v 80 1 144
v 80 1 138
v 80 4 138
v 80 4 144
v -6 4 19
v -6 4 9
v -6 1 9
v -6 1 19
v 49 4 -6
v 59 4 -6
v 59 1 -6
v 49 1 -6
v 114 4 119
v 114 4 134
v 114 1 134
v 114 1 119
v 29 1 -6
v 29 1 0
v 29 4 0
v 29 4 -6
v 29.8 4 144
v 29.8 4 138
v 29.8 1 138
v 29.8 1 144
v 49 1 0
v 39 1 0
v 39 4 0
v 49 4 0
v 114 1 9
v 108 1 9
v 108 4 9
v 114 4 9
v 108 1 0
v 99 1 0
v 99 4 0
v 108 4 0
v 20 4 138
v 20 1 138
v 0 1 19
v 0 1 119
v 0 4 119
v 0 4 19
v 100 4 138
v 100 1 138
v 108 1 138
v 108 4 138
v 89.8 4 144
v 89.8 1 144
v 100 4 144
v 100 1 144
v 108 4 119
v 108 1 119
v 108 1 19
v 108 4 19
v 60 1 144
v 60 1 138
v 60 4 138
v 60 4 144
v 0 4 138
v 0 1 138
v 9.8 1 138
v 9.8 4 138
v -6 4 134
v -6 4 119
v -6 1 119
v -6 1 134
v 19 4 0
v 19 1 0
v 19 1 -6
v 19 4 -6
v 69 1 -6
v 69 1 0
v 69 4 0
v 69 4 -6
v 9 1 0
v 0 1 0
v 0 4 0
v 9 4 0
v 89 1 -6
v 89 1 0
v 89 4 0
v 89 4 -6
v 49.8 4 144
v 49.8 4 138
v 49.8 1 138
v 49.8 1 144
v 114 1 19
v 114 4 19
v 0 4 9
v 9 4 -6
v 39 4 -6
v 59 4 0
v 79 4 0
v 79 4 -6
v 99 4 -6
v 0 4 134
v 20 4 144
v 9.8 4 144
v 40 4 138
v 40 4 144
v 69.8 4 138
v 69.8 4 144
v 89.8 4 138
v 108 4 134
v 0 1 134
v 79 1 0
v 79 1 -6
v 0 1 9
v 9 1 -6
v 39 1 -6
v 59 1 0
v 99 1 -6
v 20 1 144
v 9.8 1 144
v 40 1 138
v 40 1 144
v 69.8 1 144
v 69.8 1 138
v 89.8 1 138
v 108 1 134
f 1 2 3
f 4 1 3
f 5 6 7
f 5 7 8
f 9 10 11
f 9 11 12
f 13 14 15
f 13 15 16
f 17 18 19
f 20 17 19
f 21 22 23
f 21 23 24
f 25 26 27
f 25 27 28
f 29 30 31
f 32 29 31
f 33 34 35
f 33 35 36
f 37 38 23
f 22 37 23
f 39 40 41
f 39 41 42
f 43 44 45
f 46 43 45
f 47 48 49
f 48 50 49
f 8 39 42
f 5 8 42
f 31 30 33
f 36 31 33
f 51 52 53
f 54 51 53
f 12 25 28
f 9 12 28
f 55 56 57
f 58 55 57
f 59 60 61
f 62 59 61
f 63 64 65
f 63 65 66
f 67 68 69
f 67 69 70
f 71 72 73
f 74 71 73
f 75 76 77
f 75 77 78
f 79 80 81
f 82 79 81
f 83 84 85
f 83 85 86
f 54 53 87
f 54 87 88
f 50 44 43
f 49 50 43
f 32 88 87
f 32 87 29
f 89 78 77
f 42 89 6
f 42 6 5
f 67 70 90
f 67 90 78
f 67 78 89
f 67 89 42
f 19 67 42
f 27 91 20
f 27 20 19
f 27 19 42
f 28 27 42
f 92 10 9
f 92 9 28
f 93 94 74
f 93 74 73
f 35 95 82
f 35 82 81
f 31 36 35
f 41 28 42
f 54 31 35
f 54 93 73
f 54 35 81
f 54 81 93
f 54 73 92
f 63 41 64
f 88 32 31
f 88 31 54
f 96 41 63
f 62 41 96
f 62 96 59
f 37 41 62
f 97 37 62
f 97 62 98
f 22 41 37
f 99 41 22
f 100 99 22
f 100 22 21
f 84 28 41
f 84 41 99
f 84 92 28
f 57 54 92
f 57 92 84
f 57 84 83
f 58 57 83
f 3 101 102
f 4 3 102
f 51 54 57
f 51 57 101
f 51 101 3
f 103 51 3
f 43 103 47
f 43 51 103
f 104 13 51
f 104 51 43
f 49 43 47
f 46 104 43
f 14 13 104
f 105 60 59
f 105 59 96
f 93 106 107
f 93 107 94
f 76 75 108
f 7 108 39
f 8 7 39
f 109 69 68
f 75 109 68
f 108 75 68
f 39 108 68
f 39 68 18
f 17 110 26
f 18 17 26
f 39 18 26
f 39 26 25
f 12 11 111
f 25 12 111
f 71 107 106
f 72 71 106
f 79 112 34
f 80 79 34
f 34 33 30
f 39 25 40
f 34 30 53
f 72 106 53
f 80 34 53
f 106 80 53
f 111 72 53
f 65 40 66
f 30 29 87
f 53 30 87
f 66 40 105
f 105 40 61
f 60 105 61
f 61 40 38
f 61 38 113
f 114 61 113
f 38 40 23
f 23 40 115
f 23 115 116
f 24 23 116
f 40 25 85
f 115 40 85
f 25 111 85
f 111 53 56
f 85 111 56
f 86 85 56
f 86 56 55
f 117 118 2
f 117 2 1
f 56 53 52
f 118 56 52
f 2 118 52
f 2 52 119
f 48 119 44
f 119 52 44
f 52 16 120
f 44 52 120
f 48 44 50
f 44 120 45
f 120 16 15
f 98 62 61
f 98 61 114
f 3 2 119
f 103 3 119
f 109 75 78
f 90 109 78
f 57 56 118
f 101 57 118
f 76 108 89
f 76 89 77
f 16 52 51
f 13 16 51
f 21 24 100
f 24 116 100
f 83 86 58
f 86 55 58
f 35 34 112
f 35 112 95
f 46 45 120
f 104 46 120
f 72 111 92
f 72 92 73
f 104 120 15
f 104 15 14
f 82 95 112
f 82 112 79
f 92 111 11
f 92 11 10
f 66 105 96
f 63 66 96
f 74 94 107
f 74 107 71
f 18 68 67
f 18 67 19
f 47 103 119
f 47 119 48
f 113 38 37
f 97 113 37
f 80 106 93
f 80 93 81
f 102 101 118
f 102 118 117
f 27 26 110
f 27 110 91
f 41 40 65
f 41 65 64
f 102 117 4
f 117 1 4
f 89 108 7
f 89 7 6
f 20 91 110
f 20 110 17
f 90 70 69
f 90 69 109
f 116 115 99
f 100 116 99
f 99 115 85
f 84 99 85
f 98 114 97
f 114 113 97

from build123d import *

# Parameters (mm, degrees)
SKETCH_1_W          = 108
SKETCH_1_H          = 138
EXTRUDE_1_DEPTH     = 4
SKETCH_3_W          = 108
SKETCH_3_H          = 138
CUT_EXTRUDE_2_DEPTH = 1
SKETCH_4_W          = 10
SKETCH_4_H          = 3
EXTRUDE_2_DEPTH     = 6
SKETCH_5_W          = 10
SKETCH_5_H          = 3
SKETCH_5_W_2        = 15
EXTRUDE_3_DEPTH     = 6
SKETCH_6_W          = 15
SKETCH_6_H          = 3
SKETCH_6_W_2        = 10
EXTRUDE_4_DEPTH     = 6
SKETCH_7_W          = 10
SKETCH_7_H          = 3
EXTRUDE_5_DEPTH     = 6
SKETCH_8_W          = 6
SKETCH_8_H          = 3
EXTRUDE_6_DEPTH     = 0.2
SKETCH_9_W          = 6
SKETCH_9_H          = 3
EXTRUDE_7_DEPTH     = 0.2
SKETCH_10_W         = 6
SKETCH_10_H         = 3
EXTRUDE_8_DEPTH     = 0.2
SKETCH_11_W         = 6
SKETCH_11_H         = 3
EXTRUDE_9_DEPTH     = 0.2
SKETCH_12_W         = 6
SKETCH_12_H         = 3
EXTRUDE_10_DEPTH    = 0.2


with BuildPart() as part:
    # Эскиз1 → Бобышка-Вытянуть1 (new body)
    with BuildSketch(Plane(origin=(0, 0, 0), x_dir=(1, 0, 0), z_dir=(0, 1, 0))):
        with Locations((54, -69)):
            Rectangle(SKETCH_1_W, SKETCH_1_H)
    extrude(amount=EXTRUDE_1_DEPTH)

    # Эскиз3 → Вырез-Вытянуть2 (cut)
    with BuildSketch(Plane.XZ):
        with Locations((54, 69)):
            Rectangle(SKETCH_3_W, SKETCH_3_H)
    extrude(amount=-CUT_EXTRUDE_2_DEPTH, mode=Mode.SUBTRACT)

    # Эскиз4 → Бобышка-Вытянуть2 (add)
    with BuildSketch(Plane.XY.offset(138)):
        with Locations((15, 2.5)):
            Rectangle(SKETCH_4_W, SKETCH_4_H)
        with Locations((35, 2.5)):
            Rectangle(SKETCH_4_W, SKETCH_4_H)
        with Locations((55, 2.5)):
            Rectangle(SKETCH_4_W, SKETCH_4_H)
        with Locations((75, 2.5)):
            Rectangle(SKETCH_4_W, SKETCH_4_H)
        with Locations((95, 2.5)):
            Rectangle(SKETCH_4_W, SKETCH_4_H)
    extrude(amount=EXTRUDE_2_DEPTH)

    # Эскиз5 → Бобышка-Вытянуть3 (add)
    with BuildSketch(Plane.ZY):
        with Locations((14, 2.5)):
            Rectangle(SKETCH_5_W, SKETCH_5_H)
        with Locations((126.5, 2.5)):
            Rectangle(SKETCH_5_W_2, SKETCH_5_H)
    extrude(amount=EXTRUDE_3_DEPTH)

    # Эскиз6 → Бобышка-Вытянуть4 (add)
    with BuildSketch(Plane(origin=(108, 0, 0), x_dir=(0, 0, -1), z_dir=(1, 0, 0))):
        with Locations((-126.5, 2.5)):
            Rectangle(SKETCH_6_W, SKETCH_6_H)
        with Locations((-14, 2.5)):
            Rectangle(SKETCH_6_W_2, SKETCH_6_H)
    extrude(amount=EXTRUDE_4_DEPTH)

    # Эскиз7 → Бобышка-Вытянуть5 (add)
    with BuildSketch(Plane(origin=(0, 0, 0), x_dir=(-1, 0, 0), z_dir=(0, 0, -1))):
        with Locations((-94, 2.5)):
            Rectangle(SKETCH_7_W, SKETCH_7_H)
        with Locations((-74, 2.5)):
            Rectangle(SKETCH_7_W, SKETCH_7_H)
        with Locations((-54, 2.5)):
            Rectangle(SKETCH_7_W, SKETCH_7_H)
        with Locations((-34, 2.5)):
            Rectangle(SKETCH_7_W, SKETCH_7_H)
        with Locations((-14, 2.5)):
            Rectangle(SKETCH_7_W, SKETCH_7_H)
    extrude(amount=EXTRUDE_5_DEPTH)

    # Эскиз8 → Бобышка-Вытянуть6 (add)
    with BuildSketch(Plane.ZY.offset(-10)):
        with Locations((141, 2.5)):
            Rectangle(SKETCH_8_W, SKETCH_8_H)
    extrude(amount=EXTRUDE_6_DEPTH)

    # Эскиз9 → Бобышка-Вытянуть7 (add)
    with BuildSketch(Plane.ZY.offset(-30)):
        with Locations((141, 2.5)):
            Rectangle(SKETCH_9_W, SKETCH_9_H)
    extrude(amount=EXTRUDE_7_DEPTH)

    # Эскиз10 → Бобышка-Вытянуть8 (add)
    with BuildSketch(Plane.ZY.offset(-50)):
        with Locations((141, 2.5)):
            Rectangle(SKETCH_10_W, SKETCH_10_H)
    extrude(amount=EXTRUDE_8_DEPTH)

    # Эскиз11 → Бобышка-Вытянуть9 (add)
    with BuildSketch(Plane.ZY.offset(-70)):
        with Locations((141, 2.5)):
            Rectangle(SKETCH_11_W, SKETCH_11_H)
    extrude(amount=EXTRUDE_9_DEPTH)

    # Эскиз12 → Бобышка-Вытянуть10 (add)
    with BuildSketch(Plane.ZY.offset(-90)):
        with Locations((141, 2.5)):
            Rectangle(SKETCH_12_W, SKETCH_12_H)
    extrude(amount=EXTRUDE_10_DEPTH)


solid = part.part
